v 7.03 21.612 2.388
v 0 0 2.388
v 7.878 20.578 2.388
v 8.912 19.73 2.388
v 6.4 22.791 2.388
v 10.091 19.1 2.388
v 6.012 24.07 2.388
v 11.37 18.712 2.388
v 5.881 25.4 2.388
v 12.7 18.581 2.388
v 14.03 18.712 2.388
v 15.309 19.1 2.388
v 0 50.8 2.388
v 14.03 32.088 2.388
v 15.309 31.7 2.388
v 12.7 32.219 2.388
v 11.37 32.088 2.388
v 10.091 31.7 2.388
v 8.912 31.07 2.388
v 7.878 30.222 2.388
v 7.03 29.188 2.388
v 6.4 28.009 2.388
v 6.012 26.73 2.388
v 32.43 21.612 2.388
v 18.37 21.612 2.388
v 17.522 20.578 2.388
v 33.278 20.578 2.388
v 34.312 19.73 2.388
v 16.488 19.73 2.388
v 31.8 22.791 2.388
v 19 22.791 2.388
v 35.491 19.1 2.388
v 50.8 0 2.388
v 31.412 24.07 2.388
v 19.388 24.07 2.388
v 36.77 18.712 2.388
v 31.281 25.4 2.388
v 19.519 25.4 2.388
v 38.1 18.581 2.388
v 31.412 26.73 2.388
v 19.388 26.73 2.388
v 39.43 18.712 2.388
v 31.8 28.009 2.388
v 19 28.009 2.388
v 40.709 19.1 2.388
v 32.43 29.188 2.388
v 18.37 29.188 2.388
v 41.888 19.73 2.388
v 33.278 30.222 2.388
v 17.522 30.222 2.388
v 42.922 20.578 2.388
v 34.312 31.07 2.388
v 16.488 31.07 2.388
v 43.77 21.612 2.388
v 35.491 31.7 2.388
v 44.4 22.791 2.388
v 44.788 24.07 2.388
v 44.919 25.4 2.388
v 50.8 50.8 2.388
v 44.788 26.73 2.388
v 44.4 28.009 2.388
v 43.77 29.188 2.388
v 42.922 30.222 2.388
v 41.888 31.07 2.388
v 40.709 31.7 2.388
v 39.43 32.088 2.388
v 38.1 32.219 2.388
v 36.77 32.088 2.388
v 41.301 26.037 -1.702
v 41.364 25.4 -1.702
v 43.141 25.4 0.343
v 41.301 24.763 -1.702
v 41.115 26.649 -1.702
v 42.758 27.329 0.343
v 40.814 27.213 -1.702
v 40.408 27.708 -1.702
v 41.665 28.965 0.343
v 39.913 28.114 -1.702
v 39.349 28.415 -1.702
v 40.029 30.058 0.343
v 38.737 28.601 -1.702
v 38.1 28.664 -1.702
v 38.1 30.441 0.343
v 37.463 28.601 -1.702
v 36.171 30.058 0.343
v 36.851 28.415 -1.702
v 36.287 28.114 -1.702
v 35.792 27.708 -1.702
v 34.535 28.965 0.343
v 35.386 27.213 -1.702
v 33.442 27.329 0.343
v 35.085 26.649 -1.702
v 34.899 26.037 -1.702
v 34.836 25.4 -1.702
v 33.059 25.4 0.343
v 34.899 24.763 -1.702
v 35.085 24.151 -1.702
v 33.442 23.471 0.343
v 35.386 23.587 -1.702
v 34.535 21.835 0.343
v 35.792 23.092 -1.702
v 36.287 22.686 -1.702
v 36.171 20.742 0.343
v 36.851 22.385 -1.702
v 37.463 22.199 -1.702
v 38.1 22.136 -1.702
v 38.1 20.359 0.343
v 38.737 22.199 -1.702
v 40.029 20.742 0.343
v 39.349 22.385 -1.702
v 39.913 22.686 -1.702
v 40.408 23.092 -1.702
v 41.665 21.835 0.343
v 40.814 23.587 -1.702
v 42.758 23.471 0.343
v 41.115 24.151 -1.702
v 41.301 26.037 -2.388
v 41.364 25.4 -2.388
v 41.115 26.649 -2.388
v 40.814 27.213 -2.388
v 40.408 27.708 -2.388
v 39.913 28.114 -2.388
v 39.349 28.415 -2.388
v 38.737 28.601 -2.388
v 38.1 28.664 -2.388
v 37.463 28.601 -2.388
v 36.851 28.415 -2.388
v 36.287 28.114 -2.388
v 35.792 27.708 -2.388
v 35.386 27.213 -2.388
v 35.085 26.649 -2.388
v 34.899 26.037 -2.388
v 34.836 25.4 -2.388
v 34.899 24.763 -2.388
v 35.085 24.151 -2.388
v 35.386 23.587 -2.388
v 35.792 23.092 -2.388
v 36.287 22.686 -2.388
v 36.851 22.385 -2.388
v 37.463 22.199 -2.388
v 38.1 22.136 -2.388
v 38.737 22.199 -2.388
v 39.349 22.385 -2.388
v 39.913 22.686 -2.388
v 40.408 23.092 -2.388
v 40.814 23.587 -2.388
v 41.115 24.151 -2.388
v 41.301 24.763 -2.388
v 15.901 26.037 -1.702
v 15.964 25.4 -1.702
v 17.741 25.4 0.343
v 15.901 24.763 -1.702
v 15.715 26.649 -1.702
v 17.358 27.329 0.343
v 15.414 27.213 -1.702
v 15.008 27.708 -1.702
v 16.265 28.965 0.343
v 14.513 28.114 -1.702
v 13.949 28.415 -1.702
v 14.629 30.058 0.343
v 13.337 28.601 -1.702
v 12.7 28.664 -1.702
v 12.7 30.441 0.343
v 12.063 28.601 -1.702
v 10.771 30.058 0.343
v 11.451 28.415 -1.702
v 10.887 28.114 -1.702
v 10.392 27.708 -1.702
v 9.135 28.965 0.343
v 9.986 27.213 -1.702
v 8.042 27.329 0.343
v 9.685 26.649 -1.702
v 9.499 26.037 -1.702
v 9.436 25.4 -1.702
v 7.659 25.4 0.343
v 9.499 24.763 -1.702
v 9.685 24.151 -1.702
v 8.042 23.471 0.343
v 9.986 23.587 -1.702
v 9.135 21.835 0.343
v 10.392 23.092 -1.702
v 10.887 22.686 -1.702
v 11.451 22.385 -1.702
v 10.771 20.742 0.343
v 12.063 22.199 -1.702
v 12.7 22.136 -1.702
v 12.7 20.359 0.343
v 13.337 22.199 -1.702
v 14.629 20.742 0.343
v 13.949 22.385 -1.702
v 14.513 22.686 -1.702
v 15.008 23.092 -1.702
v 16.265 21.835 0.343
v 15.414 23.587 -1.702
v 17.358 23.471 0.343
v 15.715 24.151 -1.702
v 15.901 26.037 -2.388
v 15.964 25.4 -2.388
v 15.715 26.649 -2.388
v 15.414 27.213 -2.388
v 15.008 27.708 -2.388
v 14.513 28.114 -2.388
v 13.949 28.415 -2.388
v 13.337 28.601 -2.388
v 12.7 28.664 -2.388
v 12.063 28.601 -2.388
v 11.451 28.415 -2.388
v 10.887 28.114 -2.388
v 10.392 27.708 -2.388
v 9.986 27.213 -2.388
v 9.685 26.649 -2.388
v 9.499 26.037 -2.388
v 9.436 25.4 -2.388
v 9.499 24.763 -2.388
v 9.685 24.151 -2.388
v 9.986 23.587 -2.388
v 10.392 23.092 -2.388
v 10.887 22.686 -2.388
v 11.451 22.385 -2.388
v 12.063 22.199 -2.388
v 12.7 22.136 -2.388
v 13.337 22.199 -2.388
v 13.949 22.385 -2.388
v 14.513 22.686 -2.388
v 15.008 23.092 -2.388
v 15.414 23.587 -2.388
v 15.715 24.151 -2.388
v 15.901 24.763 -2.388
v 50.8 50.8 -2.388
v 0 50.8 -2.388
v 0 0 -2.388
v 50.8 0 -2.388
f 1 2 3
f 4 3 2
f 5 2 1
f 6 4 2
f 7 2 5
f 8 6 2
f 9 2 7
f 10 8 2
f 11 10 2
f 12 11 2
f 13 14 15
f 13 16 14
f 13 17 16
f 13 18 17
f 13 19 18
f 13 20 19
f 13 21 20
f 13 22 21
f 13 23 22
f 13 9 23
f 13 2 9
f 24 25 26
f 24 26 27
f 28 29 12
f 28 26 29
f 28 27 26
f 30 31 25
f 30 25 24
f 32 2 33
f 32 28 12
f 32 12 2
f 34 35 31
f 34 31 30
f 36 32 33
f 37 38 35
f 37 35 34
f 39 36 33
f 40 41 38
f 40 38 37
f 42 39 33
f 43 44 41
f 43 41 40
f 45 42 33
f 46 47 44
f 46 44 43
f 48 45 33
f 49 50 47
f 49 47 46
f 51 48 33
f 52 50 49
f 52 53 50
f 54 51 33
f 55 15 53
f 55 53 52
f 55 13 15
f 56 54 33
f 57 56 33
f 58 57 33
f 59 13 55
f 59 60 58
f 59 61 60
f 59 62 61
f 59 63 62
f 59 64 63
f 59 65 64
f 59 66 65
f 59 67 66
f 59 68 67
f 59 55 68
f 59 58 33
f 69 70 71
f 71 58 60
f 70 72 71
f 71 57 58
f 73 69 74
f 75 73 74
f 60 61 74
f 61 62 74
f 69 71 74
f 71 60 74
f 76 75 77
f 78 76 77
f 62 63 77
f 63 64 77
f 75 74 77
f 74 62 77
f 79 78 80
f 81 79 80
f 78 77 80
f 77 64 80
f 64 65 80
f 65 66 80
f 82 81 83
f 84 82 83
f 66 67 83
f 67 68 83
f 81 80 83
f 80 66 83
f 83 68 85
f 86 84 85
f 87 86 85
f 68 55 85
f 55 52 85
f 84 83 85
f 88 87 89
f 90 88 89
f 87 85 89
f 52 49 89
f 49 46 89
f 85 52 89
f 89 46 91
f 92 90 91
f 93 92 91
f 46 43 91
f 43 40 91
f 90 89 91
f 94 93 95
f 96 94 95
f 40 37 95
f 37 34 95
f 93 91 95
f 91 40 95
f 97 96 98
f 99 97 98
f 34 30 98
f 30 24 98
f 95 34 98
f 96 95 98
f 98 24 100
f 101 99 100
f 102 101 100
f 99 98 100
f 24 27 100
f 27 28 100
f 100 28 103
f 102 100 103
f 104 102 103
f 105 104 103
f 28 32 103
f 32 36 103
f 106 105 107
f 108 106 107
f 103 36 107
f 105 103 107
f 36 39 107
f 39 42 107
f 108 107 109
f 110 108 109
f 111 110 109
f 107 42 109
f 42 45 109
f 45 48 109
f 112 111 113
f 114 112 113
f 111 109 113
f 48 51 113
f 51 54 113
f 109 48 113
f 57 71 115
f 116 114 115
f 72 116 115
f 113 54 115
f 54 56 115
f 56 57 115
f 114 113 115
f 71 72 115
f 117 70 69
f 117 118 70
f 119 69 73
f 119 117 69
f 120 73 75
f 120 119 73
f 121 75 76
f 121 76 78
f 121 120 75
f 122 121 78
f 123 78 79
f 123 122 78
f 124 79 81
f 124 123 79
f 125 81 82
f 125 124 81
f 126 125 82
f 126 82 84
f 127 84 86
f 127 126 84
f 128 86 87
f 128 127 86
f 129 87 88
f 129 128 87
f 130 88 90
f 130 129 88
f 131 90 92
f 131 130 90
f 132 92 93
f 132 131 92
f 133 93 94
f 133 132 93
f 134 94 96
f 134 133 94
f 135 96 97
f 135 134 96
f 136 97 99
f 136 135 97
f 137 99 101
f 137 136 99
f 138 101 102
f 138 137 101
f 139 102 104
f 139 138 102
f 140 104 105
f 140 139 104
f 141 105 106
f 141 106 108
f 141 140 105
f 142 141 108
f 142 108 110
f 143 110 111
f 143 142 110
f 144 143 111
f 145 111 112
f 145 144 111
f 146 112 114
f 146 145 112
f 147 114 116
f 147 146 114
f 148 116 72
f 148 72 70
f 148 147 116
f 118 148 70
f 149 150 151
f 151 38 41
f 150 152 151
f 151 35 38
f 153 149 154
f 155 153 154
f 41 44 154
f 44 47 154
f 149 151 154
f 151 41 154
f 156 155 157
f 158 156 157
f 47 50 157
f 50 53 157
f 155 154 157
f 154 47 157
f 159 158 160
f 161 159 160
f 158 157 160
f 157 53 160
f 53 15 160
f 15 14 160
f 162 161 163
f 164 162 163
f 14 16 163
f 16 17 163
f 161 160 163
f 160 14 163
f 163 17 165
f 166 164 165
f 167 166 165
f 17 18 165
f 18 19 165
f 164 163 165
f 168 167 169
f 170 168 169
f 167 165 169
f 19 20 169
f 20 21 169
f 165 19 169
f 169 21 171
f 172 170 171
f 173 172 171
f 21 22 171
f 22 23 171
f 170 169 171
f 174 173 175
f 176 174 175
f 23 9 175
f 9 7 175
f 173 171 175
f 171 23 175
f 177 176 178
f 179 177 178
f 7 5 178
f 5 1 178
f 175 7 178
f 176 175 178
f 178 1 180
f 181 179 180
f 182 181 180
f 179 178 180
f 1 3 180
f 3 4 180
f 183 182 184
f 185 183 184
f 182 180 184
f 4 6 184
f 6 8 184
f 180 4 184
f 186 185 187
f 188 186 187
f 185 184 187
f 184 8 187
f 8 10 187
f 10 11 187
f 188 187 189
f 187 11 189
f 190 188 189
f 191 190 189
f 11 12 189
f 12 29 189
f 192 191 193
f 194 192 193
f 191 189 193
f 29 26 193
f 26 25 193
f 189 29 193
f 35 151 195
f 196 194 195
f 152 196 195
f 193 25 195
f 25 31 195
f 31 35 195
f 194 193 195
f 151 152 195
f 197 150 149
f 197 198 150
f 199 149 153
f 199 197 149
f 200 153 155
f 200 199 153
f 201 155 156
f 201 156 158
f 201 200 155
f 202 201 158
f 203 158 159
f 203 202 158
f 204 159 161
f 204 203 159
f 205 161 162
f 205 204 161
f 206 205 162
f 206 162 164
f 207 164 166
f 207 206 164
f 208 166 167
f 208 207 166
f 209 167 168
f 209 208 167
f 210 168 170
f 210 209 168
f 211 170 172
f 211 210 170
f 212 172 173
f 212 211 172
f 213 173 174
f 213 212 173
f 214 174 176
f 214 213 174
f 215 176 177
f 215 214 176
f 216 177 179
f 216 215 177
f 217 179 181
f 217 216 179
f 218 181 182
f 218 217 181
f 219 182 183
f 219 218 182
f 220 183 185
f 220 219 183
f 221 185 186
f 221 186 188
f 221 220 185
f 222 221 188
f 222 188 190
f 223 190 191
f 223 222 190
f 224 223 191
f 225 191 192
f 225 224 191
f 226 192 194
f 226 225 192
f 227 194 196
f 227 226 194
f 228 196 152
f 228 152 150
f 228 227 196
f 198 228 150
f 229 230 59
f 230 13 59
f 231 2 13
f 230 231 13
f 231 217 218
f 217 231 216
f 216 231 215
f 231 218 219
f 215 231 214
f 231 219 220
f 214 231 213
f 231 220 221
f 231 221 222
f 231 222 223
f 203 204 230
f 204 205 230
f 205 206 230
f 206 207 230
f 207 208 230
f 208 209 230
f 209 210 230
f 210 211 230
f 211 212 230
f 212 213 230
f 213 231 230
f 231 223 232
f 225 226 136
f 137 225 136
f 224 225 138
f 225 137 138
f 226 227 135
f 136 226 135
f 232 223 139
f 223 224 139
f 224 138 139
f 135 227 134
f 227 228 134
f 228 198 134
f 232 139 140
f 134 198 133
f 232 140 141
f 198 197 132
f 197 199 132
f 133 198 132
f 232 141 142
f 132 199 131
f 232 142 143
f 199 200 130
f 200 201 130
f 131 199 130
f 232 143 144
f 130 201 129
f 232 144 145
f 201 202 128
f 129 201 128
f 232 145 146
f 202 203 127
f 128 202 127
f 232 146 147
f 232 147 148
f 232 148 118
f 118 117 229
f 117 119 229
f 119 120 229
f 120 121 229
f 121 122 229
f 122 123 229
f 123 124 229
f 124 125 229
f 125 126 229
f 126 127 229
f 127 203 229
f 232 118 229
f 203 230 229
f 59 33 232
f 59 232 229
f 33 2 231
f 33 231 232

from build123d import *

# Parameters (mm, degrees)
SKETCH1_W           = 50.8
SKETCH1_H           = 50.8
SKETCH1_R           = 3.2639
BOSS_EXTRUDE1_DEPTH = 2.3876
CUT_EXTRUDE1_START  = -4.0894
SKETCH2_R           = 3.2639
CUT_EXTRUDE1_DEPTH  = 5.0894
CUT_EXTRUDE1_TAPER  = -41


with BuildPart() as part:
    # Sketch1 → Boss-Extrude1 (new body, symmetric)
    with BuildSketch(Plane.XY):
        with Locations((25.4, 25.4)):
            Rectangle(SKETCH1_W, SKETCH1_H)
        with Locations((12.7, 25.4)):
            Circle(SKETCH1_R, mode=Mode.SUBTRACT)
        with Locations((38.1, 25.4)):
            Circle(SKETCH1_R, mode=Mode.SUBTRACT)
    extrude(amount=BOSS_EXTRUDE1_DEPTH, both=True)

    # Sketch2 → Cut-Extrude1 (cut, through all)
    with BuildSketch(Plane.XY.offset(2.3876).offset(CUT_EXTRUDE1_START)):
        with Locations((12.7, 25.4)):
            Circle(SKETCH2_R)
        with Locations((38.1, 25.4)):
            Circle(SKETCH2_R)
    extrude(amount=CUT_EXTRUDE1_DEPTH, taper=CUT_EXTRUDE1_TAPER, mode=Mode.SUBTRACT)


solid = part.part
